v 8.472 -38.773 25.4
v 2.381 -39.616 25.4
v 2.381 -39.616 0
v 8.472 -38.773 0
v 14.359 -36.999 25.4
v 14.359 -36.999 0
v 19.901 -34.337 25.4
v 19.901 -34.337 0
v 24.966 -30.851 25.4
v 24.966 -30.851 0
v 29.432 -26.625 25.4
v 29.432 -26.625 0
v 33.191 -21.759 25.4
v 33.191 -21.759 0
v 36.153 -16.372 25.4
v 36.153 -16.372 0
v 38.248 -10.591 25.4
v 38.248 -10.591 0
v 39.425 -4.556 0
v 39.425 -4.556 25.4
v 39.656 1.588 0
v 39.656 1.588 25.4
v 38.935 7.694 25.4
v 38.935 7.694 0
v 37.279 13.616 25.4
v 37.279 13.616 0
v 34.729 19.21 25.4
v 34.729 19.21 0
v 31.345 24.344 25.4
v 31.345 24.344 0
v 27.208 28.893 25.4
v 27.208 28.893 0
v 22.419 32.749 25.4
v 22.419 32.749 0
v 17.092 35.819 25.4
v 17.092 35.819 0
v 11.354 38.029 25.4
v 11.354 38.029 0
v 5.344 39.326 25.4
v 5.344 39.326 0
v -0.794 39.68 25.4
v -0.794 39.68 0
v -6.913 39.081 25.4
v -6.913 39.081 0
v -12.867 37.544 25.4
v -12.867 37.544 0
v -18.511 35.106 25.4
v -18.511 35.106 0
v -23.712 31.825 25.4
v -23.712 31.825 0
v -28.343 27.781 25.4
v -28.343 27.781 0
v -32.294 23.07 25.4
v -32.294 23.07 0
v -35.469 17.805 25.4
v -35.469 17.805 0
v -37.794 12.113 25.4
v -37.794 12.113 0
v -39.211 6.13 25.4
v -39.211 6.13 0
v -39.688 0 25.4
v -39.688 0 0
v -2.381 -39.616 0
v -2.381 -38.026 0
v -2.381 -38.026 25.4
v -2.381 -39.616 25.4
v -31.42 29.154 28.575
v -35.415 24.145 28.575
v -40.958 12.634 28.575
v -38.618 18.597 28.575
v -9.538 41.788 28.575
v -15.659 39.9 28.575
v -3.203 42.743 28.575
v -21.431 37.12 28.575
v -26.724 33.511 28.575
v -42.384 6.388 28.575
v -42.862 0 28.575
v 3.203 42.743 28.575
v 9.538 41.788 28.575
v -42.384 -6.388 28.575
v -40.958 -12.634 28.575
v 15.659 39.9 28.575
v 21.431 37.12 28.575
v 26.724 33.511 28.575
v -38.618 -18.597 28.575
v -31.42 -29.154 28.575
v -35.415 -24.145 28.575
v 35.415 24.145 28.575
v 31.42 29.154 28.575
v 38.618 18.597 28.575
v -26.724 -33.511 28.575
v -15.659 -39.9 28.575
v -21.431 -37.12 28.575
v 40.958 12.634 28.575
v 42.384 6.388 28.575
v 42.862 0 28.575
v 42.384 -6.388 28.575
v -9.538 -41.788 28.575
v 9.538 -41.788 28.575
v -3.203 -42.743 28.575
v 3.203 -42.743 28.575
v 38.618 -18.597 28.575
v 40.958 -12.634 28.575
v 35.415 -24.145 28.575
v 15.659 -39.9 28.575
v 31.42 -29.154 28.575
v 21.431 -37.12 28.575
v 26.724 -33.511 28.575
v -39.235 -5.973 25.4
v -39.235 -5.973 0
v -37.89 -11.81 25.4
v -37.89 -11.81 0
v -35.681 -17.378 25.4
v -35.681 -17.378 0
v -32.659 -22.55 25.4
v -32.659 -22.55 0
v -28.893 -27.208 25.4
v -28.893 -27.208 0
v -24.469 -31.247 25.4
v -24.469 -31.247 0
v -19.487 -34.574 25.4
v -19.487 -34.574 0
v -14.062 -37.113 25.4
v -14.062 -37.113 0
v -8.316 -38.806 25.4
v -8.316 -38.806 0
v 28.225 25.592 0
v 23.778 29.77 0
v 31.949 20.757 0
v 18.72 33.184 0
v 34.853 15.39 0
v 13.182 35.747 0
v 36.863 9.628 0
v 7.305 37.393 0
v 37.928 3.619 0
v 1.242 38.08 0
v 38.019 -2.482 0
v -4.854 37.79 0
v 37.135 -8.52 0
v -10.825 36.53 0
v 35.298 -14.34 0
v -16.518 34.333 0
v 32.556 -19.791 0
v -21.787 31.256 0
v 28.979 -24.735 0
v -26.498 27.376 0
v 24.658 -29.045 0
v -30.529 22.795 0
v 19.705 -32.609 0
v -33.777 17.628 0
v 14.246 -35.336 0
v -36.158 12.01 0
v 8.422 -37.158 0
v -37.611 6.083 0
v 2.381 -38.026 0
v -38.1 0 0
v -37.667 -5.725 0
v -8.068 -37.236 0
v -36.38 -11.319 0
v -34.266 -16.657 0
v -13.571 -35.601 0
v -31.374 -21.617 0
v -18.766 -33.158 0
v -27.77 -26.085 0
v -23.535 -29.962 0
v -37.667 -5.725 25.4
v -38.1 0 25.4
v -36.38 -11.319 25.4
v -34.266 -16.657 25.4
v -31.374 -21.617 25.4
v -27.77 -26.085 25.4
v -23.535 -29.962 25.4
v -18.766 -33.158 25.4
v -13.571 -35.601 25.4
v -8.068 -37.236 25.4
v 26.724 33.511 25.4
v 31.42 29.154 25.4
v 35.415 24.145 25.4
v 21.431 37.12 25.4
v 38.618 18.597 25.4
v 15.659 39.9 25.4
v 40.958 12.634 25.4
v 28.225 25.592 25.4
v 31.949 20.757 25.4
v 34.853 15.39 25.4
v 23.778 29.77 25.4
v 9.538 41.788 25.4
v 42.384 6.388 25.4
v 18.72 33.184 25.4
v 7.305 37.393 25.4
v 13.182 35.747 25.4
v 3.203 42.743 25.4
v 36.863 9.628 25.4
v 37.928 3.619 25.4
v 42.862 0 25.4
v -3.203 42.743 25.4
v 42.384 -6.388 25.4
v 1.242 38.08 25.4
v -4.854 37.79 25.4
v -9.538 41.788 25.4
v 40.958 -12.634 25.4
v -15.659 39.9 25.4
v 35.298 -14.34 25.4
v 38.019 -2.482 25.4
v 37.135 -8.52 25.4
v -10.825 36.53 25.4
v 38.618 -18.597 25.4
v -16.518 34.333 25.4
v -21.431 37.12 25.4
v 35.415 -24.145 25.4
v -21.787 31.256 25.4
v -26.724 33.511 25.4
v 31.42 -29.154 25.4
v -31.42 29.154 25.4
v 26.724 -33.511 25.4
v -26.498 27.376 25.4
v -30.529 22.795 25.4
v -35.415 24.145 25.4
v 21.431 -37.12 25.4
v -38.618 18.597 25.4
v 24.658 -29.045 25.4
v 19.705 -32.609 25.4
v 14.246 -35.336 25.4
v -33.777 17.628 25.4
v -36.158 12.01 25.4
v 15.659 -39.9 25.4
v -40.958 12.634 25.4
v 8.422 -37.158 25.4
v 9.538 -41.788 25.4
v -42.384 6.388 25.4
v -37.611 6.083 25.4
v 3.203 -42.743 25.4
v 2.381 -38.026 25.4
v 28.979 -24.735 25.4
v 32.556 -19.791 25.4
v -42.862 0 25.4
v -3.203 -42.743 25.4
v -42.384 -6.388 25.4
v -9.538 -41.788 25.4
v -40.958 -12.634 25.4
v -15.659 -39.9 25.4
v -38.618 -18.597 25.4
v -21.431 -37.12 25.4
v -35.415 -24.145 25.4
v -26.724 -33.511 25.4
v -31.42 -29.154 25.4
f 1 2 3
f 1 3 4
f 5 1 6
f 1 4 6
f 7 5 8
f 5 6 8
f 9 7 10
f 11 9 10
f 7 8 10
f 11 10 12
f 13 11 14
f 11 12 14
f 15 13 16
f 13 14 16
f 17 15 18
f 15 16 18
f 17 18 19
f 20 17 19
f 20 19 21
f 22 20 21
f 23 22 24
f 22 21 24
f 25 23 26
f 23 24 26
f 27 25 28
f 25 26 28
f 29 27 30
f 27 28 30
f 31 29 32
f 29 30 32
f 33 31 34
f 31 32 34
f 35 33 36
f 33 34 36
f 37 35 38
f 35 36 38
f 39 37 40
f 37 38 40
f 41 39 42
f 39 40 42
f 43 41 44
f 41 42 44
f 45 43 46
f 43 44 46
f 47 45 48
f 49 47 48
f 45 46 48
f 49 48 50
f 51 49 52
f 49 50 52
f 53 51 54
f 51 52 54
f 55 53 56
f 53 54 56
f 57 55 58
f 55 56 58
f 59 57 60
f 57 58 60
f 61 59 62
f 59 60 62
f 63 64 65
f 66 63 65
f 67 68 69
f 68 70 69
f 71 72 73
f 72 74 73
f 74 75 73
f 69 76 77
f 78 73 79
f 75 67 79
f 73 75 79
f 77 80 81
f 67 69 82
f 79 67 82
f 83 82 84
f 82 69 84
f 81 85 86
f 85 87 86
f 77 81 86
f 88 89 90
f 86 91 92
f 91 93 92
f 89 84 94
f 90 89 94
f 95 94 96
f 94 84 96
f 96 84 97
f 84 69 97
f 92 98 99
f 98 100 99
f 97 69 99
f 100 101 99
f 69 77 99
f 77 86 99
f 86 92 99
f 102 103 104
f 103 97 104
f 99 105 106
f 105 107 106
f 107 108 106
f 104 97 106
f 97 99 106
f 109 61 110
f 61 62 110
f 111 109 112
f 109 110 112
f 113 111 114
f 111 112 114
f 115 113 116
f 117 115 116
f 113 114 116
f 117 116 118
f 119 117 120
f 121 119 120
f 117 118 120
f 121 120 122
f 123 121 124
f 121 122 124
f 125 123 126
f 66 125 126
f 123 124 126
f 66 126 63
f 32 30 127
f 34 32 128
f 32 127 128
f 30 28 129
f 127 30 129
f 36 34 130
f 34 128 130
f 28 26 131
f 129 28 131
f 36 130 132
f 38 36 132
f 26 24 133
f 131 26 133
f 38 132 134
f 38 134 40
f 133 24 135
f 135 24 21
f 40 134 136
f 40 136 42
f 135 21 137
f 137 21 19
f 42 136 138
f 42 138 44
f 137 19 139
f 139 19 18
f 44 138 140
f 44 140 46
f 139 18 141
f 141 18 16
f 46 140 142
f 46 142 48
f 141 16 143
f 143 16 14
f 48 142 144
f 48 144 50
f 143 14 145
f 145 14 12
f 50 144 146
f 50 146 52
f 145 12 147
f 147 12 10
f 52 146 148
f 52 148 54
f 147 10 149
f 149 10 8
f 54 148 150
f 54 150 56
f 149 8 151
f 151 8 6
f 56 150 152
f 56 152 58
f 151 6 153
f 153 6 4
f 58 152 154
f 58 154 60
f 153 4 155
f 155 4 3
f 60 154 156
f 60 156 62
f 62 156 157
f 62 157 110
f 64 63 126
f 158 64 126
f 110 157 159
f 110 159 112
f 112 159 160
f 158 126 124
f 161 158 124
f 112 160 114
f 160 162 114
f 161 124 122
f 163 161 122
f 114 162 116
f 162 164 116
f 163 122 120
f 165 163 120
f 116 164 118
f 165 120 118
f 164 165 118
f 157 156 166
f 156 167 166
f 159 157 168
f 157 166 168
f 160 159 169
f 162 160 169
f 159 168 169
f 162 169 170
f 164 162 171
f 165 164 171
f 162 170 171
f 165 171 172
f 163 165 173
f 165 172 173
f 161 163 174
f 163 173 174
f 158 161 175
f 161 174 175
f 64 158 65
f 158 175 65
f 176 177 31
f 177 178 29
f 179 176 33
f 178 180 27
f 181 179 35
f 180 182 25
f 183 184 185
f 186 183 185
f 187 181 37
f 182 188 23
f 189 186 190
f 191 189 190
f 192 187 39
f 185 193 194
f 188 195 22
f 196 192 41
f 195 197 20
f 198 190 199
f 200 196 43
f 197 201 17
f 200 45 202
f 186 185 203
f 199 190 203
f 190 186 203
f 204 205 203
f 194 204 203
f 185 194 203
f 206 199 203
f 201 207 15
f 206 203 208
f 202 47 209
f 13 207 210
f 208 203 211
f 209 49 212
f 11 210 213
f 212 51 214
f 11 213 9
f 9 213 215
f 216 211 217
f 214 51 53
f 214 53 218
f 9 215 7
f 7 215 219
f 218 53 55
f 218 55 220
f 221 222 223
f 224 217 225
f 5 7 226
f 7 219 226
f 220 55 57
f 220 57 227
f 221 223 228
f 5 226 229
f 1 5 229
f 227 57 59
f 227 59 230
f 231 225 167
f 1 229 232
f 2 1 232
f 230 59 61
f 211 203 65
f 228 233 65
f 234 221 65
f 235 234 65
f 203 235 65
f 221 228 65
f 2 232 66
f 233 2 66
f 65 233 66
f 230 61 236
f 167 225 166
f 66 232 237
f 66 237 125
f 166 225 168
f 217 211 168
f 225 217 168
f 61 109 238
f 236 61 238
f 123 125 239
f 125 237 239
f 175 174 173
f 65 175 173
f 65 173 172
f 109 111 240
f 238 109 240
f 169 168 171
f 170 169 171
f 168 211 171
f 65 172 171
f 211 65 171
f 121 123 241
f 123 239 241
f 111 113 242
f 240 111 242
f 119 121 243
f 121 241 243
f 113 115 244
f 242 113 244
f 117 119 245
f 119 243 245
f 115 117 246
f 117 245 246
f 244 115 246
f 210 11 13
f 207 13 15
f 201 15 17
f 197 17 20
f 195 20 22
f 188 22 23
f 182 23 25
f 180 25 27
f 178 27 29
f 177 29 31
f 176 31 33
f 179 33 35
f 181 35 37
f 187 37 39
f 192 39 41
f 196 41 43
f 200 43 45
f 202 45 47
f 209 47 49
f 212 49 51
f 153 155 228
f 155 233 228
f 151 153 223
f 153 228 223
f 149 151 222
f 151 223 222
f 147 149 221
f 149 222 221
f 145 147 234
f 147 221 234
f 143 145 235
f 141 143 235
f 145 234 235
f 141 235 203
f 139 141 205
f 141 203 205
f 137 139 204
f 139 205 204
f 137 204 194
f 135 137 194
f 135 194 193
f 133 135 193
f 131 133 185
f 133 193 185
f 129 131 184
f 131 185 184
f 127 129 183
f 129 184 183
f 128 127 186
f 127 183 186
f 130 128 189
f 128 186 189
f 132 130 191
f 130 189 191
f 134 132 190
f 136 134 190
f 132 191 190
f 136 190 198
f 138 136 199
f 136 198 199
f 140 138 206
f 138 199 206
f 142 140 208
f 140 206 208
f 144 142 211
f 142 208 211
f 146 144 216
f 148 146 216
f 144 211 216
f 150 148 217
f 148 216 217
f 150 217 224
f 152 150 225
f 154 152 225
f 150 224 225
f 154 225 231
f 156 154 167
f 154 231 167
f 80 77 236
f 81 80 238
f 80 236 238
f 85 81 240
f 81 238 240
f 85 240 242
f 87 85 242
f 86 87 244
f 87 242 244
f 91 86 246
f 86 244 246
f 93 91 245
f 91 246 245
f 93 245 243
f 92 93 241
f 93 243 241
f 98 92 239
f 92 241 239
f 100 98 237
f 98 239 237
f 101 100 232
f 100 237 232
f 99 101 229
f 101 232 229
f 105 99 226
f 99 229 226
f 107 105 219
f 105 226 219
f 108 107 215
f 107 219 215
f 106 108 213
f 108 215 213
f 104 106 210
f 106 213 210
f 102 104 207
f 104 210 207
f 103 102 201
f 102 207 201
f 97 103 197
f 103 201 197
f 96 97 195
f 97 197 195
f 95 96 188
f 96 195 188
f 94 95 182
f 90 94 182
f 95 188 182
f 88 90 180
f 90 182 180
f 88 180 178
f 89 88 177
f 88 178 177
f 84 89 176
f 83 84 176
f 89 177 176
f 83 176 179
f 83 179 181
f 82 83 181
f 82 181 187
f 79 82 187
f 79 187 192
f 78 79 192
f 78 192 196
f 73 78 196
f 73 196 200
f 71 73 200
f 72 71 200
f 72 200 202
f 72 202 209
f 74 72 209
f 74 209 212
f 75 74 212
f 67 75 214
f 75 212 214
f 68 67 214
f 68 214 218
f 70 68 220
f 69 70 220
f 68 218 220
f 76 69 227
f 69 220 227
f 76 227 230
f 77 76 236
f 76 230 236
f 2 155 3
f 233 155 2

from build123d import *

# Parameters (mm, degrees)
F2_W     = 4.7625
F2_H     = 25.4
F3_DEPTH = 42.8635


with BuildPart() as f1:
    # F0 (on Front) → F1 (revolve)
    with BuildSketch(Plane.XZ):
        Polygon((-39.6875, 0), (-38.1, 0), (-38.1, 25.4), (0, 25.4), (0, 28.575), (-42.8625, 28.575), (-42.8625, 25.4), (-39.6875, 25.4), align=None)
    revolve(axis=Axis((0, 0, 14.2875), (0, 0, 1)))

    # F2 (on Front) → F3 (cut, through all)
    with BuildSketch(Plane.XZ):
        with Locations((0, 12.7)):
            Rectangle(F2_W, F2_H)
    extrude(amount=F3_DEPTH, mode=Mode.SUBTRACT)


solid = f1.part
